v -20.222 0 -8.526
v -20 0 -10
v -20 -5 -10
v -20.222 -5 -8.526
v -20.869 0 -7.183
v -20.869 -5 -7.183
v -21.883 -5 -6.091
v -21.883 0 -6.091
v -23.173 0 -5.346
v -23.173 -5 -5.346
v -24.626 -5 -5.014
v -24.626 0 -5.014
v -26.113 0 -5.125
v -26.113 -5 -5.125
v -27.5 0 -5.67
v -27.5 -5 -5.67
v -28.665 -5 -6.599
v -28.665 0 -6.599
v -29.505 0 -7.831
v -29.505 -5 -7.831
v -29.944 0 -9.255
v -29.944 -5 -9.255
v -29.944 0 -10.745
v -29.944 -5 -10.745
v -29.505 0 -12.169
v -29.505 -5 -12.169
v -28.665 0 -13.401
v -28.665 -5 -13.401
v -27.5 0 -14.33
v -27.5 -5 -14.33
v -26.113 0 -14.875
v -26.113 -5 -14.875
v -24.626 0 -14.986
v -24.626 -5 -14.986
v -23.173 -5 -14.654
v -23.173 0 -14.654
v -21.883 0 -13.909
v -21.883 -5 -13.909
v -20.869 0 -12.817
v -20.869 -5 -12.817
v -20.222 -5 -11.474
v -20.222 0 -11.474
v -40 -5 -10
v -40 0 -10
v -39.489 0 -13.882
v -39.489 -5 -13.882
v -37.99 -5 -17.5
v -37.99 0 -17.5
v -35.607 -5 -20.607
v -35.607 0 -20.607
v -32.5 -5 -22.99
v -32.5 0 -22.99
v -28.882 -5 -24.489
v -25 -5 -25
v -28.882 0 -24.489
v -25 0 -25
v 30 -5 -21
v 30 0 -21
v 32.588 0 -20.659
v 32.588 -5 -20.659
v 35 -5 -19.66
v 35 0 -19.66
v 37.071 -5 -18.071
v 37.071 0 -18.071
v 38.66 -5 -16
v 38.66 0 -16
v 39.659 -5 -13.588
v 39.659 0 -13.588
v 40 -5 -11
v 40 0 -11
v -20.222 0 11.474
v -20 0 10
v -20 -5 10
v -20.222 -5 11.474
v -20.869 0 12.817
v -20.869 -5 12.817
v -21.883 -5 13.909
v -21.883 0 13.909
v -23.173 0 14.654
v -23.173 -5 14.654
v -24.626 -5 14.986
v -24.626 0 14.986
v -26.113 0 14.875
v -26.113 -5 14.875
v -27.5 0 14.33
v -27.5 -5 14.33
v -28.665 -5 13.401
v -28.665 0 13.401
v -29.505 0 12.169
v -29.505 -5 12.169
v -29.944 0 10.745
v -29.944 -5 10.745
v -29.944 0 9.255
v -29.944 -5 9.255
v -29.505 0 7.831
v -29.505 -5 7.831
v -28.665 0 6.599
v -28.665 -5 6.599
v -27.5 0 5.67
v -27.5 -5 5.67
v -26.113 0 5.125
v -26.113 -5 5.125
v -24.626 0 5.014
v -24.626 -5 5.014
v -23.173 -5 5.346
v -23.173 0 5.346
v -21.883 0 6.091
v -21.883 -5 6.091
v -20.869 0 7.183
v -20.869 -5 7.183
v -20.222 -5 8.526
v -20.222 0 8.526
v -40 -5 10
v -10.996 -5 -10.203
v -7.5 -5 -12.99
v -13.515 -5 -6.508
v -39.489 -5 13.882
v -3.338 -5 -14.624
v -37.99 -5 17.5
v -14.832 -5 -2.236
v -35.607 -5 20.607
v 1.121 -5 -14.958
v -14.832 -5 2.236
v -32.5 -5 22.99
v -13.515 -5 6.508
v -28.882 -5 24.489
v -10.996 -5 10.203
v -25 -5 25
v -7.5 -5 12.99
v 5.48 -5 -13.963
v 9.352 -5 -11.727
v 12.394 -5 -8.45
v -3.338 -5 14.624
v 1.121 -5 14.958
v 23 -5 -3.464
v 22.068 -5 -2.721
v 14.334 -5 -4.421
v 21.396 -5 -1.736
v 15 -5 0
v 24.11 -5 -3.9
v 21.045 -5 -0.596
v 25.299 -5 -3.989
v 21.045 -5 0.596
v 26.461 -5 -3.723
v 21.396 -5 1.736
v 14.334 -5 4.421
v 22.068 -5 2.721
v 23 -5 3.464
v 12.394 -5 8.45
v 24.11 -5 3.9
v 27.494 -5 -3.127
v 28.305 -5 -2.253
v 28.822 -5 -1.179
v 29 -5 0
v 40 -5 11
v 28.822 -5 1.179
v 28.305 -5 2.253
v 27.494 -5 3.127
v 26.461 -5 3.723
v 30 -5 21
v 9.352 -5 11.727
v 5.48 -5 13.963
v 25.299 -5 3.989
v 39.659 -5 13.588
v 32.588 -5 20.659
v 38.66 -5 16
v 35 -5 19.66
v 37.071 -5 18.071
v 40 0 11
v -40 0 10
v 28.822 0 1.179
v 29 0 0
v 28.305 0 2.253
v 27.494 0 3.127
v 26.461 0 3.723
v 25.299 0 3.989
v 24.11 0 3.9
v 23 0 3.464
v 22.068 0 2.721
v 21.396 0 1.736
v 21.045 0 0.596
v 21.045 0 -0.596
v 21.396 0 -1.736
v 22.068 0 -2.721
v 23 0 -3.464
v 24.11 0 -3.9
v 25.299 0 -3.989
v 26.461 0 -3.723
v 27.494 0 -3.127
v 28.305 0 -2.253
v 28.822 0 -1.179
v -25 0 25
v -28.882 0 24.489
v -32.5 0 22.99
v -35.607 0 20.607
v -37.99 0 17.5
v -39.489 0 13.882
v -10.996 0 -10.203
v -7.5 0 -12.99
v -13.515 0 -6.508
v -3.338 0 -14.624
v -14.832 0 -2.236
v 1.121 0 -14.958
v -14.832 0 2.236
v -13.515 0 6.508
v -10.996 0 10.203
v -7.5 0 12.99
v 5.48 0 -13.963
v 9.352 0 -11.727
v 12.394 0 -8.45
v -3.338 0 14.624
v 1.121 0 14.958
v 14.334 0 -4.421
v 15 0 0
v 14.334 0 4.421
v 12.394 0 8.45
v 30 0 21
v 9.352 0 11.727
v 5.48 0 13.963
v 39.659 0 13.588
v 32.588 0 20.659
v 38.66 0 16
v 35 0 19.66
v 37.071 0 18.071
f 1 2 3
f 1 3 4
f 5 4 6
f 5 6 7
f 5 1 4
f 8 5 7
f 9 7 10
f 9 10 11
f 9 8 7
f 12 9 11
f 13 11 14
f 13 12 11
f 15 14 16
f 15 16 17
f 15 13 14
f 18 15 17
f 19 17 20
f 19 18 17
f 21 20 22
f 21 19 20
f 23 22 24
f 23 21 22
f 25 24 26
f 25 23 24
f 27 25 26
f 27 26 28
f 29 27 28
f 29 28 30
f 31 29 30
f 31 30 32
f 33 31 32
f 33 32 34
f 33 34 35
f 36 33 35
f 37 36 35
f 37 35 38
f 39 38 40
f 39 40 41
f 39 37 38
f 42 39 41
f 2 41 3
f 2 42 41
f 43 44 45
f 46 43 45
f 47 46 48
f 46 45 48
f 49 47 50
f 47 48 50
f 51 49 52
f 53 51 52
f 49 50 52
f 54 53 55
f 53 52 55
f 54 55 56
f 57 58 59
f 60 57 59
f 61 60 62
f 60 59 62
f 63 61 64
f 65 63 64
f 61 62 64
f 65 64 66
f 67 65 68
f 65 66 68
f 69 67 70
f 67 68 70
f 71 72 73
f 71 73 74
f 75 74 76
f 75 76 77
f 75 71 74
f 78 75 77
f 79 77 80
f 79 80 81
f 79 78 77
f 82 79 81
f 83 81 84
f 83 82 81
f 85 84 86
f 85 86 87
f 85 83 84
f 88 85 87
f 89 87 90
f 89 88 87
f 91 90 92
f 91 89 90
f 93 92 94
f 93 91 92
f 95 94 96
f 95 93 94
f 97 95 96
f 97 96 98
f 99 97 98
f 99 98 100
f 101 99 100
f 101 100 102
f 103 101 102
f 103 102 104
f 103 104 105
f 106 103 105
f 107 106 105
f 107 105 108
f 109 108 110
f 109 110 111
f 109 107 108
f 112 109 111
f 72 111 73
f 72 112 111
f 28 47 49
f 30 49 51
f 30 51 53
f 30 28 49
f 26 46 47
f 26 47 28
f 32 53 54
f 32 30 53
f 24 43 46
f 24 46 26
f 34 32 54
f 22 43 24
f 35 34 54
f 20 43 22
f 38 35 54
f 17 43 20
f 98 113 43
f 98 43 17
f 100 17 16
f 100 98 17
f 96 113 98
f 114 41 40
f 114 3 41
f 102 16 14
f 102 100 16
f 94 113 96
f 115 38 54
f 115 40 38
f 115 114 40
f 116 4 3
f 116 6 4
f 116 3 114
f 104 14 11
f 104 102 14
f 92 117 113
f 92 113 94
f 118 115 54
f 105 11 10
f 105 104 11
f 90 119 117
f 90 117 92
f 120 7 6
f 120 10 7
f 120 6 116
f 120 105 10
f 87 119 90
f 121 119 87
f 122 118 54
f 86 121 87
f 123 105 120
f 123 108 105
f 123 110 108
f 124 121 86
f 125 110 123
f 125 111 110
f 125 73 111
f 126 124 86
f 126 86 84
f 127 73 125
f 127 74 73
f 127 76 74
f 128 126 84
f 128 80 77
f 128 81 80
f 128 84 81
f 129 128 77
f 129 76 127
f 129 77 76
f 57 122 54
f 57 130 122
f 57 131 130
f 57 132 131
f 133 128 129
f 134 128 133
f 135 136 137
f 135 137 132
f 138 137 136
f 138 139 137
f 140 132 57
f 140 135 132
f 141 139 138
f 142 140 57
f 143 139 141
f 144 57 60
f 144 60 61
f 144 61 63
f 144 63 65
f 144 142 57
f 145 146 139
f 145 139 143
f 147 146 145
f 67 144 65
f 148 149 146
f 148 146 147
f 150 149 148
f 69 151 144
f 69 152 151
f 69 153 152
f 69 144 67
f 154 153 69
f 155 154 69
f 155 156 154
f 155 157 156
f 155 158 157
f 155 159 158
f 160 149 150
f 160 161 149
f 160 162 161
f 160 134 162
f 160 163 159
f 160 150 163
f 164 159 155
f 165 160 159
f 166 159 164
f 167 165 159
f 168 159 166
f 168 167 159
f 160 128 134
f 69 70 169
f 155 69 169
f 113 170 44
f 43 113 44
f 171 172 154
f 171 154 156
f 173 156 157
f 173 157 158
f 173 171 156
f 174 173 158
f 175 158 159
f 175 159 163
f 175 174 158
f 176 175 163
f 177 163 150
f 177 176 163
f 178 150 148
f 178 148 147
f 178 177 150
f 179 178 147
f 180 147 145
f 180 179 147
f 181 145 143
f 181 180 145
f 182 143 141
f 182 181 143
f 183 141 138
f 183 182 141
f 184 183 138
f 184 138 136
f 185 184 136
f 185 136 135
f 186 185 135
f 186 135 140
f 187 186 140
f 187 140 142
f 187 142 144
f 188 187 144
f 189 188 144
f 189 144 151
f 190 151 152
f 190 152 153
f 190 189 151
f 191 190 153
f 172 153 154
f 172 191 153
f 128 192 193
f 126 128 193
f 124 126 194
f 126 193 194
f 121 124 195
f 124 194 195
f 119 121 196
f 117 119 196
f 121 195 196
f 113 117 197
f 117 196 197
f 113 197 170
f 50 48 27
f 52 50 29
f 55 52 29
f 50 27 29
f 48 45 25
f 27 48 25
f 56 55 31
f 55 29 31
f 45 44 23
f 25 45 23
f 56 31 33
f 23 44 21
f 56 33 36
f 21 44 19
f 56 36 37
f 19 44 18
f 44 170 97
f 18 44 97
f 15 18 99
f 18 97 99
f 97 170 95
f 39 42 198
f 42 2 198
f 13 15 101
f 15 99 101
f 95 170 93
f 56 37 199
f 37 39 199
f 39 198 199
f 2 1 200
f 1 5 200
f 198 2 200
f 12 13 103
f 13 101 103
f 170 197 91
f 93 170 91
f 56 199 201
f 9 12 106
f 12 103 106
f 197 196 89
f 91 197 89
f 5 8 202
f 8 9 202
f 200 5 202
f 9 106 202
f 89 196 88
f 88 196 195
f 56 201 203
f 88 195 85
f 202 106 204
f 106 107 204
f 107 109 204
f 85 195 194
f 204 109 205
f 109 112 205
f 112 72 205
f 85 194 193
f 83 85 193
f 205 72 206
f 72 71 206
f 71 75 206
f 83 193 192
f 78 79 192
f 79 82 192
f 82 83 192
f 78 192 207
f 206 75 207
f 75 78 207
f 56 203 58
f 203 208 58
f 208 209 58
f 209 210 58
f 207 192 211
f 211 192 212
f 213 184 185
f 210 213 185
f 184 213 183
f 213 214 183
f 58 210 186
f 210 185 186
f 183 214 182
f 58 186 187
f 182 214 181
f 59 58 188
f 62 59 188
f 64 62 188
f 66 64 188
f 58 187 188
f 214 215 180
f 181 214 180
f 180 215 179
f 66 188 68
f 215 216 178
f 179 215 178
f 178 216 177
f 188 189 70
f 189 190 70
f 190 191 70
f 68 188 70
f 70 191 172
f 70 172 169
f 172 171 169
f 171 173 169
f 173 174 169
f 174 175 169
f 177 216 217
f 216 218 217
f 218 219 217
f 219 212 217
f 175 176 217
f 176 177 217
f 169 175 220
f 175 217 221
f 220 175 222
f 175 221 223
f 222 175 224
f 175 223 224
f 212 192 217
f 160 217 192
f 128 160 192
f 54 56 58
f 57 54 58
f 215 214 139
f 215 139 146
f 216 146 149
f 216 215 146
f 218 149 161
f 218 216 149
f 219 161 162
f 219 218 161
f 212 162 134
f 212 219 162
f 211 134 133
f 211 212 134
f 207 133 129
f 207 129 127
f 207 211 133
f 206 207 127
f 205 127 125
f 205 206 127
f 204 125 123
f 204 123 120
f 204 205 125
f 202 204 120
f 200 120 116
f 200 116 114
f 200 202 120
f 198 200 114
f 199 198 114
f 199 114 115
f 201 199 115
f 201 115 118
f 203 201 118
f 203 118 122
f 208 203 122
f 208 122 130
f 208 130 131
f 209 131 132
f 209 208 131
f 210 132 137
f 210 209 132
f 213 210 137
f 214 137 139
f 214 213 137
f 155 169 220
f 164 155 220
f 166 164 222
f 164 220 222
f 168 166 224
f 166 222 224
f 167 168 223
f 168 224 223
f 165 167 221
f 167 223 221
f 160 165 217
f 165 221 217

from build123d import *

# Parameters (mm, degrees)
F0_R     = 5
F0_R_2   = 15
F0_R_3   = 4
F1_DEPTH = 5


with BuildPart() as f1:
    # F0 (on Front) → F1 (new body)
    with BuildSketch(Plane.XZ):
        with BuildLine():
            ThreePointArc((-25, 25), (-35.606602, 20.606602), (-40, 10))
            Line((-40, 10), (-40, 0))
            Line((-40, 0), (-40, -10))
            ThreePointArc((-40, -10), (-35.606602, -20.606602), (-25, -25))
            Line((-25, -25), (30, -21))
            ThreePointArc((30, -21), (37.071068, -18.071068), (40, -11))
            Line((40, -11), (40, 0))
            Line((40, 0), (40, 11))
            ThreePointArc((40, 11), (37.071068, 18.071068), (30, 21))
            Line((30, 21), (-25, 25))
        make_face()
        with Locations((-25, -10)):
            Circle(F0_R, mode=Mode.SUBTRACT)
        with Locations((-25, 10)):
            Circle(F0_R, mode=Mode.SUBTRACT)
        Circle(F0_R_2, mode=Mode.SUBTRACT)
        with Locations((25, 0)):
            Circle(F0_R_3, mode=Mode.SUBTRACT)
    extrude(amount=F1_DEPTH)


solid = f1.part
